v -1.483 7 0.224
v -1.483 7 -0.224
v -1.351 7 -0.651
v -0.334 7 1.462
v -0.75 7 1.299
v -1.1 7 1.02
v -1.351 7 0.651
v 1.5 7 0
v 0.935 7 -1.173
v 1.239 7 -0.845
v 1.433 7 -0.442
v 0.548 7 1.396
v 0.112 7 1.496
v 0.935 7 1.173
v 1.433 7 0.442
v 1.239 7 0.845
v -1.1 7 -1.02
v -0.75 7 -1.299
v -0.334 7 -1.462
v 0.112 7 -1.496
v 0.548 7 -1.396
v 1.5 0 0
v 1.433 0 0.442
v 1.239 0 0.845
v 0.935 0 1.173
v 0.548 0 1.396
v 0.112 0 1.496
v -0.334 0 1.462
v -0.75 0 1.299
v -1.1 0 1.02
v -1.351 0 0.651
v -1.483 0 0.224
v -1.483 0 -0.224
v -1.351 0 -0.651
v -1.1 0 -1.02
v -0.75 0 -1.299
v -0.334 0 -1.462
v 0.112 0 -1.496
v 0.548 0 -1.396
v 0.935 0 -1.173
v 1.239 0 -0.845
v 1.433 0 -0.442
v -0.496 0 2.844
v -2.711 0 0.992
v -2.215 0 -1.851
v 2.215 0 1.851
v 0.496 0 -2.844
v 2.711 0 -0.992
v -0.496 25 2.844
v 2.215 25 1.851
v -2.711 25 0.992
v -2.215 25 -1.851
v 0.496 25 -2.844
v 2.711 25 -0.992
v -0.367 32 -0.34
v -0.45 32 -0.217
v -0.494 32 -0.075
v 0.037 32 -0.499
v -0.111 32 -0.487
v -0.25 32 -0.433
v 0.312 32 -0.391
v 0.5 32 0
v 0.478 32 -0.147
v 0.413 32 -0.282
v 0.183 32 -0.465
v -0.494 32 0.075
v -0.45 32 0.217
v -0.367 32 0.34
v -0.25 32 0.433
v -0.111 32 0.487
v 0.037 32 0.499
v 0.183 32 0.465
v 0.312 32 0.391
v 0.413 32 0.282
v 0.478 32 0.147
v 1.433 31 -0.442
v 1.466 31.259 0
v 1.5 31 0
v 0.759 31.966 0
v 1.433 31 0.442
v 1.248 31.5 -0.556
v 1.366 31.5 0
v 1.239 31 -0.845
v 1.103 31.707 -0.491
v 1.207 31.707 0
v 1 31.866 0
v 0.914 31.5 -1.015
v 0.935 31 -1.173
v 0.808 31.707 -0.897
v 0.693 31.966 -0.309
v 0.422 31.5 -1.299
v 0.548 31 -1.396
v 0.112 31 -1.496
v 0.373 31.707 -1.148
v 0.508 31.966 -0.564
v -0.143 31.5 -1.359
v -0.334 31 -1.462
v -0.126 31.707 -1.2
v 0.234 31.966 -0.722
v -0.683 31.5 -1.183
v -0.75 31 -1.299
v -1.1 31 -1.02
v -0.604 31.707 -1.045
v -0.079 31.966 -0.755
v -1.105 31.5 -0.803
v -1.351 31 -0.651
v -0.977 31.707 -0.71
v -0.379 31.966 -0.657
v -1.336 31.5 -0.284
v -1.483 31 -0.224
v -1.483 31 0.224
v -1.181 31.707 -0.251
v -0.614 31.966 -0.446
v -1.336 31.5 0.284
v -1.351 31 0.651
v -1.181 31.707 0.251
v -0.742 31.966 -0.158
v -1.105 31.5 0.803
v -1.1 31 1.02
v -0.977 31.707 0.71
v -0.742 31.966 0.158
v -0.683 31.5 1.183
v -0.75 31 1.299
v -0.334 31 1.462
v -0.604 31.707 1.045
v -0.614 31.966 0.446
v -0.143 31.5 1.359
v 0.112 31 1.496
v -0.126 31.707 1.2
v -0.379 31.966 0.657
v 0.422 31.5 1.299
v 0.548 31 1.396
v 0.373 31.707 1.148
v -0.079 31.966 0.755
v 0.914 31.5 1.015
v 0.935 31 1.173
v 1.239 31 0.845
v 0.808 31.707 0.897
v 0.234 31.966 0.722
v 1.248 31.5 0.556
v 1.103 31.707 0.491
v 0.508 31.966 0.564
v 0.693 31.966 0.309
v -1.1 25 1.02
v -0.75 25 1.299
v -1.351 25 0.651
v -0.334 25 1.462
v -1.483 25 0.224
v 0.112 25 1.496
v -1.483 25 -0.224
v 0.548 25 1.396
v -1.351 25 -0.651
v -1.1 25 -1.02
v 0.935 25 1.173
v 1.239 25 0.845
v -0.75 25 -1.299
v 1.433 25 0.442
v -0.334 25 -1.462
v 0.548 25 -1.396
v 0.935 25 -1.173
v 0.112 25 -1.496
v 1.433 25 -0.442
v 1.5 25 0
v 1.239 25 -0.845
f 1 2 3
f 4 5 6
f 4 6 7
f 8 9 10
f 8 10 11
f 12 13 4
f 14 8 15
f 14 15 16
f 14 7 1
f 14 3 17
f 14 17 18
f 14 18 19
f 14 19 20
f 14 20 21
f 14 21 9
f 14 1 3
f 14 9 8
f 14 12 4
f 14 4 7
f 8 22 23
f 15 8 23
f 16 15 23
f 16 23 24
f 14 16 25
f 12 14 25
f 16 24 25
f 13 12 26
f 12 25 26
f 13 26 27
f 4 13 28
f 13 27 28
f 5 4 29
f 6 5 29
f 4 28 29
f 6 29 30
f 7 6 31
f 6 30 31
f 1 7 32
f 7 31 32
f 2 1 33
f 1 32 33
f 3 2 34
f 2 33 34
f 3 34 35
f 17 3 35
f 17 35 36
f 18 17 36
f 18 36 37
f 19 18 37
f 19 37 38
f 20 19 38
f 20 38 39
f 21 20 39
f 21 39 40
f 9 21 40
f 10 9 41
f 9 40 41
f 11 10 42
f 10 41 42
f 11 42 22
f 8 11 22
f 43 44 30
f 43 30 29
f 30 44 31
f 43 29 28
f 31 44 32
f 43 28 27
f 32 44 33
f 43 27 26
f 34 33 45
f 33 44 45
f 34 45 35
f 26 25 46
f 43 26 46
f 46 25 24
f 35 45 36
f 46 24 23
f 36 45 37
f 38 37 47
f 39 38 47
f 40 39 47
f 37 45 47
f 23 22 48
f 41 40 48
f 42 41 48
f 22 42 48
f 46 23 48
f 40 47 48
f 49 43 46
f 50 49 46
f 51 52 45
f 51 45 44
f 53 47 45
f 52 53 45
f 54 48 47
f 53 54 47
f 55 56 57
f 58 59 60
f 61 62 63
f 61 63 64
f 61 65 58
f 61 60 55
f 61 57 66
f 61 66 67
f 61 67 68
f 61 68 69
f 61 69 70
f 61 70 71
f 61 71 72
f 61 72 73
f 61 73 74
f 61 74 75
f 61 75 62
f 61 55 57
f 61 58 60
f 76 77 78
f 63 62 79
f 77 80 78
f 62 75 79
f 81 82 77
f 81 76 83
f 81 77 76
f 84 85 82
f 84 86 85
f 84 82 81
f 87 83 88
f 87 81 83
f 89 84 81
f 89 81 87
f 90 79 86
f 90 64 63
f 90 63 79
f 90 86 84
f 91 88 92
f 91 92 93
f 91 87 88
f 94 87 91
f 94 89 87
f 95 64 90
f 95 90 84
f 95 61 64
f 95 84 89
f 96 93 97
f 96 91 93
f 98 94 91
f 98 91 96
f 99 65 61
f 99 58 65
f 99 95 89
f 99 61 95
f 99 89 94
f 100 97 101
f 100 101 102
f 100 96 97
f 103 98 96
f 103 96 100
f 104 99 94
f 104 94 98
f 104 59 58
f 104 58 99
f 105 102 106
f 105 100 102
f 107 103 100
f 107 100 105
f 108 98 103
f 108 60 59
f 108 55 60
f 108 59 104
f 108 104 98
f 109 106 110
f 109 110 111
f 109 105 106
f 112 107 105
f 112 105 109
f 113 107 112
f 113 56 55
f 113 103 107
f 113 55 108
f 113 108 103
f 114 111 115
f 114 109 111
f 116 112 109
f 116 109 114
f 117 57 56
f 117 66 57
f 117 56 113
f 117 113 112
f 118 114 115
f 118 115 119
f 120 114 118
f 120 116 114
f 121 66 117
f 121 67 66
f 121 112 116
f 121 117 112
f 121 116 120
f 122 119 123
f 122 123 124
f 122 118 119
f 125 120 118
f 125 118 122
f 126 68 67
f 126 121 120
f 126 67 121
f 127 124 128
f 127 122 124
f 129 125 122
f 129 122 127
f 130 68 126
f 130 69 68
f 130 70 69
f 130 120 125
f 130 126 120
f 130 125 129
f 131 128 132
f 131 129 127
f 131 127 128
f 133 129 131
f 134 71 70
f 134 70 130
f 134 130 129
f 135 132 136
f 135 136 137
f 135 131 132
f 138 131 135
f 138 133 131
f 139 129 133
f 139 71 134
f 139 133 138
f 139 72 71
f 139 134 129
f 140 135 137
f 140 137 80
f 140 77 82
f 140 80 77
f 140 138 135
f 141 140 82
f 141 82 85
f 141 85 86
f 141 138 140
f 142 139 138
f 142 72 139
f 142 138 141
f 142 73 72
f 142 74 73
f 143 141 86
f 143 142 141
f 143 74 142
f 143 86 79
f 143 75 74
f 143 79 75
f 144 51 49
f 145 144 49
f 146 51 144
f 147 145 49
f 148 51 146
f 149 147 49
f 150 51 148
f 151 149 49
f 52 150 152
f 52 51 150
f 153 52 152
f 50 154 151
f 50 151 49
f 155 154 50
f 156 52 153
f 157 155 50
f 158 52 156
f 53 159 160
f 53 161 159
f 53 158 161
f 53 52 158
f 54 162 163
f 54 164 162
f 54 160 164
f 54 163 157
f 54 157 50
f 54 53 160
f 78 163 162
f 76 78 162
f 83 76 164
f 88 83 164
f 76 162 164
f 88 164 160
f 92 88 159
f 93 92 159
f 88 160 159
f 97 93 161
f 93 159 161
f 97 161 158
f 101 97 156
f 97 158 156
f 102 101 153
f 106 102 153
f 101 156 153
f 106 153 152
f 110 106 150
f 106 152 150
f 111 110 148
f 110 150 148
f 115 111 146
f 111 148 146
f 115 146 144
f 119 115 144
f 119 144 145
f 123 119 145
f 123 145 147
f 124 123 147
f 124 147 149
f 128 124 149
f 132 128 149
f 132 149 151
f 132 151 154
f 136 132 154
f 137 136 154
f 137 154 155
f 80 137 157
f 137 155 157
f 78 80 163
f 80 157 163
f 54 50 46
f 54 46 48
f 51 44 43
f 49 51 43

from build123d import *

# Parameters (mm, degrees)
BOSS_EXTRUDE1_DEPTH = 25
SKETCH2_R           = 1.5
BOSS_EXTRUDE2_DEPTH = 7
SKETCH3_R           = 1.5
CUT_EXTRUDE1_DEPTH  = 7
FILLET1_R           = 1


with BuildPart() as part:
    # Sketch1 → Boss-Extrude1 (new body)
    with BuildSketch(Plane(origin=(0, 0, 0), x_dir=(1, 0, 0), z_dir=(0, 1, 0))):
        Polygon((2.214824591, -1.851454932), (2.7108193, 0.992366895), (0.495994709, 2.843821827), (-2.214824591, 1.851454932), (-2.7108193, -0.992366895), (-0.495994709, -2.843821827), align=None)
    extrude(amount=BOSS_EXTRUDE1_DEPTH)

    # Sketch2 → Boss-Extrude2 (add)
    with BuildSketch(Plane(origin=(0, 25, 0), x_dir=(1, 0, 0), z_dir=(0, 1, 0))):
        Circle(SKETCH2_R)
    extrude(amount=BOSS_EXTRUDE2_DEPTH)

    # Sketch3 → Cut-Extrude1 (cut)
    with BuildSketch(Plane.XZ):
        Circle(SKETCH3_R)
    extrude(amount=-CUT_EXTRUDE1_DEPTH, mode=Mode.SUBTRACT)

    # Fillet1
    fillet1_edges = [part.edges().sort_by_distance(p)[0] for p in [
        (-1.5, 32, 0),
    ]]
    fillet(fillet1_edges, radius=FILLET1_R)


solid = part.part
